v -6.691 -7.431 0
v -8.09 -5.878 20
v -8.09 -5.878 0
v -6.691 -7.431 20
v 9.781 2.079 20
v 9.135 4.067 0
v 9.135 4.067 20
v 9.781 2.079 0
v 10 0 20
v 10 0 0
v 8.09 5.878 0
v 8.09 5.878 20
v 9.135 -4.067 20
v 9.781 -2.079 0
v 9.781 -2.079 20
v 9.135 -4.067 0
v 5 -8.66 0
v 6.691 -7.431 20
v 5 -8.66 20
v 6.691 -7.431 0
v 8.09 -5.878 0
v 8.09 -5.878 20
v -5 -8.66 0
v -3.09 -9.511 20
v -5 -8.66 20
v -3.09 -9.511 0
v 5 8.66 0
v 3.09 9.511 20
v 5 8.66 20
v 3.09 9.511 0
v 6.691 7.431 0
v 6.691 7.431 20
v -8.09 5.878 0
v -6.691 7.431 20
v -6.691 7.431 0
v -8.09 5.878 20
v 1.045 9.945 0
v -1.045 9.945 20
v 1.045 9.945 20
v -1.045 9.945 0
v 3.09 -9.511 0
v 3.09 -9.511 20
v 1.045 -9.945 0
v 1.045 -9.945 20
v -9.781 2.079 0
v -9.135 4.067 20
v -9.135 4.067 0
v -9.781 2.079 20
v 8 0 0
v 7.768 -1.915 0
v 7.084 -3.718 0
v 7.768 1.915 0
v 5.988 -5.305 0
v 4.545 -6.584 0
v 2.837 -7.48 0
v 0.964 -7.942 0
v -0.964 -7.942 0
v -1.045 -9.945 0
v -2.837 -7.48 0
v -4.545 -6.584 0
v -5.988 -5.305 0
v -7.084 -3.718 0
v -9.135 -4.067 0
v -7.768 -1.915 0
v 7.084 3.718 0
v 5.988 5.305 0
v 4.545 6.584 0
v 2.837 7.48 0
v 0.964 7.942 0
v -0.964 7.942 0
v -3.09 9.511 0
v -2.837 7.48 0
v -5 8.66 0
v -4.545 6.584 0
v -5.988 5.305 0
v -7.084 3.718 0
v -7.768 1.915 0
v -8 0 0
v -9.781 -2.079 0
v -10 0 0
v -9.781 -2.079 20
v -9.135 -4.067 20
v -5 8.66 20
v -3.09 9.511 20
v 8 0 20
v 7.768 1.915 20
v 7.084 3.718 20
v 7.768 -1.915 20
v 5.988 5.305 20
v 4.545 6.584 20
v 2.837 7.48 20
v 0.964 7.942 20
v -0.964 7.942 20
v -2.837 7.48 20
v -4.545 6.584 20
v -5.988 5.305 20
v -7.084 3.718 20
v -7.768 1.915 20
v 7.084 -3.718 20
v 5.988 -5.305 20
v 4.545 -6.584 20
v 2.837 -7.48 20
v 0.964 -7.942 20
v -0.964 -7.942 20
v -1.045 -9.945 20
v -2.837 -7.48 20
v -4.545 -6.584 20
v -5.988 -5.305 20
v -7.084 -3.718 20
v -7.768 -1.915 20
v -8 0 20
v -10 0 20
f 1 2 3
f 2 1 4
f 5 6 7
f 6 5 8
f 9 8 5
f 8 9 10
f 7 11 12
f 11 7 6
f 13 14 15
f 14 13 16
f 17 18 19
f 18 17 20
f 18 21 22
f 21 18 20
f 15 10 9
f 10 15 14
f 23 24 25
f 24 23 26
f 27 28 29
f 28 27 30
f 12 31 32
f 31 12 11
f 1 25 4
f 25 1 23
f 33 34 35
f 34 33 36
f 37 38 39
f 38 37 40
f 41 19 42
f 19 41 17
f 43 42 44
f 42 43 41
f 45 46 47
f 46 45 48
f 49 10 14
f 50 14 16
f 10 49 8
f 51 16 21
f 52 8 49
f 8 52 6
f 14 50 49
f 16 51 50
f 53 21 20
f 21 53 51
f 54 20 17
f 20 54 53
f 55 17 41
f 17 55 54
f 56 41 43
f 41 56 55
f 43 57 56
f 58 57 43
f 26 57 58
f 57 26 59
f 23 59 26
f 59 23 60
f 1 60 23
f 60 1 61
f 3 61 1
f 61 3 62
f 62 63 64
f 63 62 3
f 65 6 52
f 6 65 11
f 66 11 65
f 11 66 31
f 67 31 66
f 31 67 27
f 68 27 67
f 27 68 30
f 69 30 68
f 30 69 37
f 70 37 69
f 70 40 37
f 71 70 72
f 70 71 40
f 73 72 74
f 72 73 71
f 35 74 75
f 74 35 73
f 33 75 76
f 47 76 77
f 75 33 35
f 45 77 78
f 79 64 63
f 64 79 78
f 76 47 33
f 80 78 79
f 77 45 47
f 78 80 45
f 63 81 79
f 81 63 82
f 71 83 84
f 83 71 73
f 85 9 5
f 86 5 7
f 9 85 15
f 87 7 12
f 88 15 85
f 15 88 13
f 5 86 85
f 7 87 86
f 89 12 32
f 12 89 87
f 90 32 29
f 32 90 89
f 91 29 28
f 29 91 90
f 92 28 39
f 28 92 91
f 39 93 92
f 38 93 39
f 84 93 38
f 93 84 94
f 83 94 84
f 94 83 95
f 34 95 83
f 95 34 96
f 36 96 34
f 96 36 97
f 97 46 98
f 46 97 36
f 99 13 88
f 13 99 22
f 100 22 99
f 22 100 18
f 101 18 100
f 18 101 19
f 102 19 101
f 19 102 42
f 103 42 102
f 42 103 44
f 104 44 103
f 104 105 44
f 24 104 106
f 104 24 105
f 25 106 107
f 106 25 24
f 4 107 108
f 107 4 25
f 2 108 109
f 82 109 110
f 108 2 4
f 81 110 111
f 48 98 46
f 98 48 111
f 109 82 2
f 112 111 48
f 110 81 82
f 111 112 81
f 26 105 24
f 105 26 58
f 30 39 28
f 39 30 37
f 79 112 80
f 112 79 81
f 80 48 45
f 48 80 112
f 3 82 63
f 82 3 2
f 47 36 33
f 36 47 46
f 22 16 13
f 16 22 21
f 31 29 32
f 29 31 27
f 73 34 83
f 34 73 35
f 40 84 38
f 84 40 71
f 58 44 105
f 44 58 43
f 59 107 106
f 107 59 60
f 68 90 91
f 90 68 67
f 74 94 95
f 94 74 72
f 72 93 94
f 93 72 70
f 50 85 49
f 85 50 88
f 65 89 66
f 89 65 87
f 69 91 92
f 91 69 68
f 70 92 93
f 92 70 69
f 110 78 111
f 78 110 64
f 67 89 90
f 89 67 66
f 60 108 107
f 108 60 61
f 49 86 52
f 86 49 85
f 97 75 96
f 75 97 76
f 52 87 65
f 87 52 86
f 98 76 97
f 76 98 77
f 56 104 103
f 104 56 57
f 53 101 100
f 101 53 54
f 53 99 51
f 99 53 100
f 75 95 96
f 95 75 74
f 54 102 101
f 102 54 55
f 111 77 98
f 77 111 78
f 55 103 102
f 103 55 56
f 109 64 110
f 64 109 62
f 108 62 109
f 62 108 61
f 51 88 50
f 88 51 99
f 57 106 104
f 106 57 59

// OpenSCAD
echo(version=version());

// cylinder portion of the group

color("red")
  difference(){
    cylinder(h=20, r1=10, r2=10);
    cylinder(h=20, r1=8, r2=8);
  }
